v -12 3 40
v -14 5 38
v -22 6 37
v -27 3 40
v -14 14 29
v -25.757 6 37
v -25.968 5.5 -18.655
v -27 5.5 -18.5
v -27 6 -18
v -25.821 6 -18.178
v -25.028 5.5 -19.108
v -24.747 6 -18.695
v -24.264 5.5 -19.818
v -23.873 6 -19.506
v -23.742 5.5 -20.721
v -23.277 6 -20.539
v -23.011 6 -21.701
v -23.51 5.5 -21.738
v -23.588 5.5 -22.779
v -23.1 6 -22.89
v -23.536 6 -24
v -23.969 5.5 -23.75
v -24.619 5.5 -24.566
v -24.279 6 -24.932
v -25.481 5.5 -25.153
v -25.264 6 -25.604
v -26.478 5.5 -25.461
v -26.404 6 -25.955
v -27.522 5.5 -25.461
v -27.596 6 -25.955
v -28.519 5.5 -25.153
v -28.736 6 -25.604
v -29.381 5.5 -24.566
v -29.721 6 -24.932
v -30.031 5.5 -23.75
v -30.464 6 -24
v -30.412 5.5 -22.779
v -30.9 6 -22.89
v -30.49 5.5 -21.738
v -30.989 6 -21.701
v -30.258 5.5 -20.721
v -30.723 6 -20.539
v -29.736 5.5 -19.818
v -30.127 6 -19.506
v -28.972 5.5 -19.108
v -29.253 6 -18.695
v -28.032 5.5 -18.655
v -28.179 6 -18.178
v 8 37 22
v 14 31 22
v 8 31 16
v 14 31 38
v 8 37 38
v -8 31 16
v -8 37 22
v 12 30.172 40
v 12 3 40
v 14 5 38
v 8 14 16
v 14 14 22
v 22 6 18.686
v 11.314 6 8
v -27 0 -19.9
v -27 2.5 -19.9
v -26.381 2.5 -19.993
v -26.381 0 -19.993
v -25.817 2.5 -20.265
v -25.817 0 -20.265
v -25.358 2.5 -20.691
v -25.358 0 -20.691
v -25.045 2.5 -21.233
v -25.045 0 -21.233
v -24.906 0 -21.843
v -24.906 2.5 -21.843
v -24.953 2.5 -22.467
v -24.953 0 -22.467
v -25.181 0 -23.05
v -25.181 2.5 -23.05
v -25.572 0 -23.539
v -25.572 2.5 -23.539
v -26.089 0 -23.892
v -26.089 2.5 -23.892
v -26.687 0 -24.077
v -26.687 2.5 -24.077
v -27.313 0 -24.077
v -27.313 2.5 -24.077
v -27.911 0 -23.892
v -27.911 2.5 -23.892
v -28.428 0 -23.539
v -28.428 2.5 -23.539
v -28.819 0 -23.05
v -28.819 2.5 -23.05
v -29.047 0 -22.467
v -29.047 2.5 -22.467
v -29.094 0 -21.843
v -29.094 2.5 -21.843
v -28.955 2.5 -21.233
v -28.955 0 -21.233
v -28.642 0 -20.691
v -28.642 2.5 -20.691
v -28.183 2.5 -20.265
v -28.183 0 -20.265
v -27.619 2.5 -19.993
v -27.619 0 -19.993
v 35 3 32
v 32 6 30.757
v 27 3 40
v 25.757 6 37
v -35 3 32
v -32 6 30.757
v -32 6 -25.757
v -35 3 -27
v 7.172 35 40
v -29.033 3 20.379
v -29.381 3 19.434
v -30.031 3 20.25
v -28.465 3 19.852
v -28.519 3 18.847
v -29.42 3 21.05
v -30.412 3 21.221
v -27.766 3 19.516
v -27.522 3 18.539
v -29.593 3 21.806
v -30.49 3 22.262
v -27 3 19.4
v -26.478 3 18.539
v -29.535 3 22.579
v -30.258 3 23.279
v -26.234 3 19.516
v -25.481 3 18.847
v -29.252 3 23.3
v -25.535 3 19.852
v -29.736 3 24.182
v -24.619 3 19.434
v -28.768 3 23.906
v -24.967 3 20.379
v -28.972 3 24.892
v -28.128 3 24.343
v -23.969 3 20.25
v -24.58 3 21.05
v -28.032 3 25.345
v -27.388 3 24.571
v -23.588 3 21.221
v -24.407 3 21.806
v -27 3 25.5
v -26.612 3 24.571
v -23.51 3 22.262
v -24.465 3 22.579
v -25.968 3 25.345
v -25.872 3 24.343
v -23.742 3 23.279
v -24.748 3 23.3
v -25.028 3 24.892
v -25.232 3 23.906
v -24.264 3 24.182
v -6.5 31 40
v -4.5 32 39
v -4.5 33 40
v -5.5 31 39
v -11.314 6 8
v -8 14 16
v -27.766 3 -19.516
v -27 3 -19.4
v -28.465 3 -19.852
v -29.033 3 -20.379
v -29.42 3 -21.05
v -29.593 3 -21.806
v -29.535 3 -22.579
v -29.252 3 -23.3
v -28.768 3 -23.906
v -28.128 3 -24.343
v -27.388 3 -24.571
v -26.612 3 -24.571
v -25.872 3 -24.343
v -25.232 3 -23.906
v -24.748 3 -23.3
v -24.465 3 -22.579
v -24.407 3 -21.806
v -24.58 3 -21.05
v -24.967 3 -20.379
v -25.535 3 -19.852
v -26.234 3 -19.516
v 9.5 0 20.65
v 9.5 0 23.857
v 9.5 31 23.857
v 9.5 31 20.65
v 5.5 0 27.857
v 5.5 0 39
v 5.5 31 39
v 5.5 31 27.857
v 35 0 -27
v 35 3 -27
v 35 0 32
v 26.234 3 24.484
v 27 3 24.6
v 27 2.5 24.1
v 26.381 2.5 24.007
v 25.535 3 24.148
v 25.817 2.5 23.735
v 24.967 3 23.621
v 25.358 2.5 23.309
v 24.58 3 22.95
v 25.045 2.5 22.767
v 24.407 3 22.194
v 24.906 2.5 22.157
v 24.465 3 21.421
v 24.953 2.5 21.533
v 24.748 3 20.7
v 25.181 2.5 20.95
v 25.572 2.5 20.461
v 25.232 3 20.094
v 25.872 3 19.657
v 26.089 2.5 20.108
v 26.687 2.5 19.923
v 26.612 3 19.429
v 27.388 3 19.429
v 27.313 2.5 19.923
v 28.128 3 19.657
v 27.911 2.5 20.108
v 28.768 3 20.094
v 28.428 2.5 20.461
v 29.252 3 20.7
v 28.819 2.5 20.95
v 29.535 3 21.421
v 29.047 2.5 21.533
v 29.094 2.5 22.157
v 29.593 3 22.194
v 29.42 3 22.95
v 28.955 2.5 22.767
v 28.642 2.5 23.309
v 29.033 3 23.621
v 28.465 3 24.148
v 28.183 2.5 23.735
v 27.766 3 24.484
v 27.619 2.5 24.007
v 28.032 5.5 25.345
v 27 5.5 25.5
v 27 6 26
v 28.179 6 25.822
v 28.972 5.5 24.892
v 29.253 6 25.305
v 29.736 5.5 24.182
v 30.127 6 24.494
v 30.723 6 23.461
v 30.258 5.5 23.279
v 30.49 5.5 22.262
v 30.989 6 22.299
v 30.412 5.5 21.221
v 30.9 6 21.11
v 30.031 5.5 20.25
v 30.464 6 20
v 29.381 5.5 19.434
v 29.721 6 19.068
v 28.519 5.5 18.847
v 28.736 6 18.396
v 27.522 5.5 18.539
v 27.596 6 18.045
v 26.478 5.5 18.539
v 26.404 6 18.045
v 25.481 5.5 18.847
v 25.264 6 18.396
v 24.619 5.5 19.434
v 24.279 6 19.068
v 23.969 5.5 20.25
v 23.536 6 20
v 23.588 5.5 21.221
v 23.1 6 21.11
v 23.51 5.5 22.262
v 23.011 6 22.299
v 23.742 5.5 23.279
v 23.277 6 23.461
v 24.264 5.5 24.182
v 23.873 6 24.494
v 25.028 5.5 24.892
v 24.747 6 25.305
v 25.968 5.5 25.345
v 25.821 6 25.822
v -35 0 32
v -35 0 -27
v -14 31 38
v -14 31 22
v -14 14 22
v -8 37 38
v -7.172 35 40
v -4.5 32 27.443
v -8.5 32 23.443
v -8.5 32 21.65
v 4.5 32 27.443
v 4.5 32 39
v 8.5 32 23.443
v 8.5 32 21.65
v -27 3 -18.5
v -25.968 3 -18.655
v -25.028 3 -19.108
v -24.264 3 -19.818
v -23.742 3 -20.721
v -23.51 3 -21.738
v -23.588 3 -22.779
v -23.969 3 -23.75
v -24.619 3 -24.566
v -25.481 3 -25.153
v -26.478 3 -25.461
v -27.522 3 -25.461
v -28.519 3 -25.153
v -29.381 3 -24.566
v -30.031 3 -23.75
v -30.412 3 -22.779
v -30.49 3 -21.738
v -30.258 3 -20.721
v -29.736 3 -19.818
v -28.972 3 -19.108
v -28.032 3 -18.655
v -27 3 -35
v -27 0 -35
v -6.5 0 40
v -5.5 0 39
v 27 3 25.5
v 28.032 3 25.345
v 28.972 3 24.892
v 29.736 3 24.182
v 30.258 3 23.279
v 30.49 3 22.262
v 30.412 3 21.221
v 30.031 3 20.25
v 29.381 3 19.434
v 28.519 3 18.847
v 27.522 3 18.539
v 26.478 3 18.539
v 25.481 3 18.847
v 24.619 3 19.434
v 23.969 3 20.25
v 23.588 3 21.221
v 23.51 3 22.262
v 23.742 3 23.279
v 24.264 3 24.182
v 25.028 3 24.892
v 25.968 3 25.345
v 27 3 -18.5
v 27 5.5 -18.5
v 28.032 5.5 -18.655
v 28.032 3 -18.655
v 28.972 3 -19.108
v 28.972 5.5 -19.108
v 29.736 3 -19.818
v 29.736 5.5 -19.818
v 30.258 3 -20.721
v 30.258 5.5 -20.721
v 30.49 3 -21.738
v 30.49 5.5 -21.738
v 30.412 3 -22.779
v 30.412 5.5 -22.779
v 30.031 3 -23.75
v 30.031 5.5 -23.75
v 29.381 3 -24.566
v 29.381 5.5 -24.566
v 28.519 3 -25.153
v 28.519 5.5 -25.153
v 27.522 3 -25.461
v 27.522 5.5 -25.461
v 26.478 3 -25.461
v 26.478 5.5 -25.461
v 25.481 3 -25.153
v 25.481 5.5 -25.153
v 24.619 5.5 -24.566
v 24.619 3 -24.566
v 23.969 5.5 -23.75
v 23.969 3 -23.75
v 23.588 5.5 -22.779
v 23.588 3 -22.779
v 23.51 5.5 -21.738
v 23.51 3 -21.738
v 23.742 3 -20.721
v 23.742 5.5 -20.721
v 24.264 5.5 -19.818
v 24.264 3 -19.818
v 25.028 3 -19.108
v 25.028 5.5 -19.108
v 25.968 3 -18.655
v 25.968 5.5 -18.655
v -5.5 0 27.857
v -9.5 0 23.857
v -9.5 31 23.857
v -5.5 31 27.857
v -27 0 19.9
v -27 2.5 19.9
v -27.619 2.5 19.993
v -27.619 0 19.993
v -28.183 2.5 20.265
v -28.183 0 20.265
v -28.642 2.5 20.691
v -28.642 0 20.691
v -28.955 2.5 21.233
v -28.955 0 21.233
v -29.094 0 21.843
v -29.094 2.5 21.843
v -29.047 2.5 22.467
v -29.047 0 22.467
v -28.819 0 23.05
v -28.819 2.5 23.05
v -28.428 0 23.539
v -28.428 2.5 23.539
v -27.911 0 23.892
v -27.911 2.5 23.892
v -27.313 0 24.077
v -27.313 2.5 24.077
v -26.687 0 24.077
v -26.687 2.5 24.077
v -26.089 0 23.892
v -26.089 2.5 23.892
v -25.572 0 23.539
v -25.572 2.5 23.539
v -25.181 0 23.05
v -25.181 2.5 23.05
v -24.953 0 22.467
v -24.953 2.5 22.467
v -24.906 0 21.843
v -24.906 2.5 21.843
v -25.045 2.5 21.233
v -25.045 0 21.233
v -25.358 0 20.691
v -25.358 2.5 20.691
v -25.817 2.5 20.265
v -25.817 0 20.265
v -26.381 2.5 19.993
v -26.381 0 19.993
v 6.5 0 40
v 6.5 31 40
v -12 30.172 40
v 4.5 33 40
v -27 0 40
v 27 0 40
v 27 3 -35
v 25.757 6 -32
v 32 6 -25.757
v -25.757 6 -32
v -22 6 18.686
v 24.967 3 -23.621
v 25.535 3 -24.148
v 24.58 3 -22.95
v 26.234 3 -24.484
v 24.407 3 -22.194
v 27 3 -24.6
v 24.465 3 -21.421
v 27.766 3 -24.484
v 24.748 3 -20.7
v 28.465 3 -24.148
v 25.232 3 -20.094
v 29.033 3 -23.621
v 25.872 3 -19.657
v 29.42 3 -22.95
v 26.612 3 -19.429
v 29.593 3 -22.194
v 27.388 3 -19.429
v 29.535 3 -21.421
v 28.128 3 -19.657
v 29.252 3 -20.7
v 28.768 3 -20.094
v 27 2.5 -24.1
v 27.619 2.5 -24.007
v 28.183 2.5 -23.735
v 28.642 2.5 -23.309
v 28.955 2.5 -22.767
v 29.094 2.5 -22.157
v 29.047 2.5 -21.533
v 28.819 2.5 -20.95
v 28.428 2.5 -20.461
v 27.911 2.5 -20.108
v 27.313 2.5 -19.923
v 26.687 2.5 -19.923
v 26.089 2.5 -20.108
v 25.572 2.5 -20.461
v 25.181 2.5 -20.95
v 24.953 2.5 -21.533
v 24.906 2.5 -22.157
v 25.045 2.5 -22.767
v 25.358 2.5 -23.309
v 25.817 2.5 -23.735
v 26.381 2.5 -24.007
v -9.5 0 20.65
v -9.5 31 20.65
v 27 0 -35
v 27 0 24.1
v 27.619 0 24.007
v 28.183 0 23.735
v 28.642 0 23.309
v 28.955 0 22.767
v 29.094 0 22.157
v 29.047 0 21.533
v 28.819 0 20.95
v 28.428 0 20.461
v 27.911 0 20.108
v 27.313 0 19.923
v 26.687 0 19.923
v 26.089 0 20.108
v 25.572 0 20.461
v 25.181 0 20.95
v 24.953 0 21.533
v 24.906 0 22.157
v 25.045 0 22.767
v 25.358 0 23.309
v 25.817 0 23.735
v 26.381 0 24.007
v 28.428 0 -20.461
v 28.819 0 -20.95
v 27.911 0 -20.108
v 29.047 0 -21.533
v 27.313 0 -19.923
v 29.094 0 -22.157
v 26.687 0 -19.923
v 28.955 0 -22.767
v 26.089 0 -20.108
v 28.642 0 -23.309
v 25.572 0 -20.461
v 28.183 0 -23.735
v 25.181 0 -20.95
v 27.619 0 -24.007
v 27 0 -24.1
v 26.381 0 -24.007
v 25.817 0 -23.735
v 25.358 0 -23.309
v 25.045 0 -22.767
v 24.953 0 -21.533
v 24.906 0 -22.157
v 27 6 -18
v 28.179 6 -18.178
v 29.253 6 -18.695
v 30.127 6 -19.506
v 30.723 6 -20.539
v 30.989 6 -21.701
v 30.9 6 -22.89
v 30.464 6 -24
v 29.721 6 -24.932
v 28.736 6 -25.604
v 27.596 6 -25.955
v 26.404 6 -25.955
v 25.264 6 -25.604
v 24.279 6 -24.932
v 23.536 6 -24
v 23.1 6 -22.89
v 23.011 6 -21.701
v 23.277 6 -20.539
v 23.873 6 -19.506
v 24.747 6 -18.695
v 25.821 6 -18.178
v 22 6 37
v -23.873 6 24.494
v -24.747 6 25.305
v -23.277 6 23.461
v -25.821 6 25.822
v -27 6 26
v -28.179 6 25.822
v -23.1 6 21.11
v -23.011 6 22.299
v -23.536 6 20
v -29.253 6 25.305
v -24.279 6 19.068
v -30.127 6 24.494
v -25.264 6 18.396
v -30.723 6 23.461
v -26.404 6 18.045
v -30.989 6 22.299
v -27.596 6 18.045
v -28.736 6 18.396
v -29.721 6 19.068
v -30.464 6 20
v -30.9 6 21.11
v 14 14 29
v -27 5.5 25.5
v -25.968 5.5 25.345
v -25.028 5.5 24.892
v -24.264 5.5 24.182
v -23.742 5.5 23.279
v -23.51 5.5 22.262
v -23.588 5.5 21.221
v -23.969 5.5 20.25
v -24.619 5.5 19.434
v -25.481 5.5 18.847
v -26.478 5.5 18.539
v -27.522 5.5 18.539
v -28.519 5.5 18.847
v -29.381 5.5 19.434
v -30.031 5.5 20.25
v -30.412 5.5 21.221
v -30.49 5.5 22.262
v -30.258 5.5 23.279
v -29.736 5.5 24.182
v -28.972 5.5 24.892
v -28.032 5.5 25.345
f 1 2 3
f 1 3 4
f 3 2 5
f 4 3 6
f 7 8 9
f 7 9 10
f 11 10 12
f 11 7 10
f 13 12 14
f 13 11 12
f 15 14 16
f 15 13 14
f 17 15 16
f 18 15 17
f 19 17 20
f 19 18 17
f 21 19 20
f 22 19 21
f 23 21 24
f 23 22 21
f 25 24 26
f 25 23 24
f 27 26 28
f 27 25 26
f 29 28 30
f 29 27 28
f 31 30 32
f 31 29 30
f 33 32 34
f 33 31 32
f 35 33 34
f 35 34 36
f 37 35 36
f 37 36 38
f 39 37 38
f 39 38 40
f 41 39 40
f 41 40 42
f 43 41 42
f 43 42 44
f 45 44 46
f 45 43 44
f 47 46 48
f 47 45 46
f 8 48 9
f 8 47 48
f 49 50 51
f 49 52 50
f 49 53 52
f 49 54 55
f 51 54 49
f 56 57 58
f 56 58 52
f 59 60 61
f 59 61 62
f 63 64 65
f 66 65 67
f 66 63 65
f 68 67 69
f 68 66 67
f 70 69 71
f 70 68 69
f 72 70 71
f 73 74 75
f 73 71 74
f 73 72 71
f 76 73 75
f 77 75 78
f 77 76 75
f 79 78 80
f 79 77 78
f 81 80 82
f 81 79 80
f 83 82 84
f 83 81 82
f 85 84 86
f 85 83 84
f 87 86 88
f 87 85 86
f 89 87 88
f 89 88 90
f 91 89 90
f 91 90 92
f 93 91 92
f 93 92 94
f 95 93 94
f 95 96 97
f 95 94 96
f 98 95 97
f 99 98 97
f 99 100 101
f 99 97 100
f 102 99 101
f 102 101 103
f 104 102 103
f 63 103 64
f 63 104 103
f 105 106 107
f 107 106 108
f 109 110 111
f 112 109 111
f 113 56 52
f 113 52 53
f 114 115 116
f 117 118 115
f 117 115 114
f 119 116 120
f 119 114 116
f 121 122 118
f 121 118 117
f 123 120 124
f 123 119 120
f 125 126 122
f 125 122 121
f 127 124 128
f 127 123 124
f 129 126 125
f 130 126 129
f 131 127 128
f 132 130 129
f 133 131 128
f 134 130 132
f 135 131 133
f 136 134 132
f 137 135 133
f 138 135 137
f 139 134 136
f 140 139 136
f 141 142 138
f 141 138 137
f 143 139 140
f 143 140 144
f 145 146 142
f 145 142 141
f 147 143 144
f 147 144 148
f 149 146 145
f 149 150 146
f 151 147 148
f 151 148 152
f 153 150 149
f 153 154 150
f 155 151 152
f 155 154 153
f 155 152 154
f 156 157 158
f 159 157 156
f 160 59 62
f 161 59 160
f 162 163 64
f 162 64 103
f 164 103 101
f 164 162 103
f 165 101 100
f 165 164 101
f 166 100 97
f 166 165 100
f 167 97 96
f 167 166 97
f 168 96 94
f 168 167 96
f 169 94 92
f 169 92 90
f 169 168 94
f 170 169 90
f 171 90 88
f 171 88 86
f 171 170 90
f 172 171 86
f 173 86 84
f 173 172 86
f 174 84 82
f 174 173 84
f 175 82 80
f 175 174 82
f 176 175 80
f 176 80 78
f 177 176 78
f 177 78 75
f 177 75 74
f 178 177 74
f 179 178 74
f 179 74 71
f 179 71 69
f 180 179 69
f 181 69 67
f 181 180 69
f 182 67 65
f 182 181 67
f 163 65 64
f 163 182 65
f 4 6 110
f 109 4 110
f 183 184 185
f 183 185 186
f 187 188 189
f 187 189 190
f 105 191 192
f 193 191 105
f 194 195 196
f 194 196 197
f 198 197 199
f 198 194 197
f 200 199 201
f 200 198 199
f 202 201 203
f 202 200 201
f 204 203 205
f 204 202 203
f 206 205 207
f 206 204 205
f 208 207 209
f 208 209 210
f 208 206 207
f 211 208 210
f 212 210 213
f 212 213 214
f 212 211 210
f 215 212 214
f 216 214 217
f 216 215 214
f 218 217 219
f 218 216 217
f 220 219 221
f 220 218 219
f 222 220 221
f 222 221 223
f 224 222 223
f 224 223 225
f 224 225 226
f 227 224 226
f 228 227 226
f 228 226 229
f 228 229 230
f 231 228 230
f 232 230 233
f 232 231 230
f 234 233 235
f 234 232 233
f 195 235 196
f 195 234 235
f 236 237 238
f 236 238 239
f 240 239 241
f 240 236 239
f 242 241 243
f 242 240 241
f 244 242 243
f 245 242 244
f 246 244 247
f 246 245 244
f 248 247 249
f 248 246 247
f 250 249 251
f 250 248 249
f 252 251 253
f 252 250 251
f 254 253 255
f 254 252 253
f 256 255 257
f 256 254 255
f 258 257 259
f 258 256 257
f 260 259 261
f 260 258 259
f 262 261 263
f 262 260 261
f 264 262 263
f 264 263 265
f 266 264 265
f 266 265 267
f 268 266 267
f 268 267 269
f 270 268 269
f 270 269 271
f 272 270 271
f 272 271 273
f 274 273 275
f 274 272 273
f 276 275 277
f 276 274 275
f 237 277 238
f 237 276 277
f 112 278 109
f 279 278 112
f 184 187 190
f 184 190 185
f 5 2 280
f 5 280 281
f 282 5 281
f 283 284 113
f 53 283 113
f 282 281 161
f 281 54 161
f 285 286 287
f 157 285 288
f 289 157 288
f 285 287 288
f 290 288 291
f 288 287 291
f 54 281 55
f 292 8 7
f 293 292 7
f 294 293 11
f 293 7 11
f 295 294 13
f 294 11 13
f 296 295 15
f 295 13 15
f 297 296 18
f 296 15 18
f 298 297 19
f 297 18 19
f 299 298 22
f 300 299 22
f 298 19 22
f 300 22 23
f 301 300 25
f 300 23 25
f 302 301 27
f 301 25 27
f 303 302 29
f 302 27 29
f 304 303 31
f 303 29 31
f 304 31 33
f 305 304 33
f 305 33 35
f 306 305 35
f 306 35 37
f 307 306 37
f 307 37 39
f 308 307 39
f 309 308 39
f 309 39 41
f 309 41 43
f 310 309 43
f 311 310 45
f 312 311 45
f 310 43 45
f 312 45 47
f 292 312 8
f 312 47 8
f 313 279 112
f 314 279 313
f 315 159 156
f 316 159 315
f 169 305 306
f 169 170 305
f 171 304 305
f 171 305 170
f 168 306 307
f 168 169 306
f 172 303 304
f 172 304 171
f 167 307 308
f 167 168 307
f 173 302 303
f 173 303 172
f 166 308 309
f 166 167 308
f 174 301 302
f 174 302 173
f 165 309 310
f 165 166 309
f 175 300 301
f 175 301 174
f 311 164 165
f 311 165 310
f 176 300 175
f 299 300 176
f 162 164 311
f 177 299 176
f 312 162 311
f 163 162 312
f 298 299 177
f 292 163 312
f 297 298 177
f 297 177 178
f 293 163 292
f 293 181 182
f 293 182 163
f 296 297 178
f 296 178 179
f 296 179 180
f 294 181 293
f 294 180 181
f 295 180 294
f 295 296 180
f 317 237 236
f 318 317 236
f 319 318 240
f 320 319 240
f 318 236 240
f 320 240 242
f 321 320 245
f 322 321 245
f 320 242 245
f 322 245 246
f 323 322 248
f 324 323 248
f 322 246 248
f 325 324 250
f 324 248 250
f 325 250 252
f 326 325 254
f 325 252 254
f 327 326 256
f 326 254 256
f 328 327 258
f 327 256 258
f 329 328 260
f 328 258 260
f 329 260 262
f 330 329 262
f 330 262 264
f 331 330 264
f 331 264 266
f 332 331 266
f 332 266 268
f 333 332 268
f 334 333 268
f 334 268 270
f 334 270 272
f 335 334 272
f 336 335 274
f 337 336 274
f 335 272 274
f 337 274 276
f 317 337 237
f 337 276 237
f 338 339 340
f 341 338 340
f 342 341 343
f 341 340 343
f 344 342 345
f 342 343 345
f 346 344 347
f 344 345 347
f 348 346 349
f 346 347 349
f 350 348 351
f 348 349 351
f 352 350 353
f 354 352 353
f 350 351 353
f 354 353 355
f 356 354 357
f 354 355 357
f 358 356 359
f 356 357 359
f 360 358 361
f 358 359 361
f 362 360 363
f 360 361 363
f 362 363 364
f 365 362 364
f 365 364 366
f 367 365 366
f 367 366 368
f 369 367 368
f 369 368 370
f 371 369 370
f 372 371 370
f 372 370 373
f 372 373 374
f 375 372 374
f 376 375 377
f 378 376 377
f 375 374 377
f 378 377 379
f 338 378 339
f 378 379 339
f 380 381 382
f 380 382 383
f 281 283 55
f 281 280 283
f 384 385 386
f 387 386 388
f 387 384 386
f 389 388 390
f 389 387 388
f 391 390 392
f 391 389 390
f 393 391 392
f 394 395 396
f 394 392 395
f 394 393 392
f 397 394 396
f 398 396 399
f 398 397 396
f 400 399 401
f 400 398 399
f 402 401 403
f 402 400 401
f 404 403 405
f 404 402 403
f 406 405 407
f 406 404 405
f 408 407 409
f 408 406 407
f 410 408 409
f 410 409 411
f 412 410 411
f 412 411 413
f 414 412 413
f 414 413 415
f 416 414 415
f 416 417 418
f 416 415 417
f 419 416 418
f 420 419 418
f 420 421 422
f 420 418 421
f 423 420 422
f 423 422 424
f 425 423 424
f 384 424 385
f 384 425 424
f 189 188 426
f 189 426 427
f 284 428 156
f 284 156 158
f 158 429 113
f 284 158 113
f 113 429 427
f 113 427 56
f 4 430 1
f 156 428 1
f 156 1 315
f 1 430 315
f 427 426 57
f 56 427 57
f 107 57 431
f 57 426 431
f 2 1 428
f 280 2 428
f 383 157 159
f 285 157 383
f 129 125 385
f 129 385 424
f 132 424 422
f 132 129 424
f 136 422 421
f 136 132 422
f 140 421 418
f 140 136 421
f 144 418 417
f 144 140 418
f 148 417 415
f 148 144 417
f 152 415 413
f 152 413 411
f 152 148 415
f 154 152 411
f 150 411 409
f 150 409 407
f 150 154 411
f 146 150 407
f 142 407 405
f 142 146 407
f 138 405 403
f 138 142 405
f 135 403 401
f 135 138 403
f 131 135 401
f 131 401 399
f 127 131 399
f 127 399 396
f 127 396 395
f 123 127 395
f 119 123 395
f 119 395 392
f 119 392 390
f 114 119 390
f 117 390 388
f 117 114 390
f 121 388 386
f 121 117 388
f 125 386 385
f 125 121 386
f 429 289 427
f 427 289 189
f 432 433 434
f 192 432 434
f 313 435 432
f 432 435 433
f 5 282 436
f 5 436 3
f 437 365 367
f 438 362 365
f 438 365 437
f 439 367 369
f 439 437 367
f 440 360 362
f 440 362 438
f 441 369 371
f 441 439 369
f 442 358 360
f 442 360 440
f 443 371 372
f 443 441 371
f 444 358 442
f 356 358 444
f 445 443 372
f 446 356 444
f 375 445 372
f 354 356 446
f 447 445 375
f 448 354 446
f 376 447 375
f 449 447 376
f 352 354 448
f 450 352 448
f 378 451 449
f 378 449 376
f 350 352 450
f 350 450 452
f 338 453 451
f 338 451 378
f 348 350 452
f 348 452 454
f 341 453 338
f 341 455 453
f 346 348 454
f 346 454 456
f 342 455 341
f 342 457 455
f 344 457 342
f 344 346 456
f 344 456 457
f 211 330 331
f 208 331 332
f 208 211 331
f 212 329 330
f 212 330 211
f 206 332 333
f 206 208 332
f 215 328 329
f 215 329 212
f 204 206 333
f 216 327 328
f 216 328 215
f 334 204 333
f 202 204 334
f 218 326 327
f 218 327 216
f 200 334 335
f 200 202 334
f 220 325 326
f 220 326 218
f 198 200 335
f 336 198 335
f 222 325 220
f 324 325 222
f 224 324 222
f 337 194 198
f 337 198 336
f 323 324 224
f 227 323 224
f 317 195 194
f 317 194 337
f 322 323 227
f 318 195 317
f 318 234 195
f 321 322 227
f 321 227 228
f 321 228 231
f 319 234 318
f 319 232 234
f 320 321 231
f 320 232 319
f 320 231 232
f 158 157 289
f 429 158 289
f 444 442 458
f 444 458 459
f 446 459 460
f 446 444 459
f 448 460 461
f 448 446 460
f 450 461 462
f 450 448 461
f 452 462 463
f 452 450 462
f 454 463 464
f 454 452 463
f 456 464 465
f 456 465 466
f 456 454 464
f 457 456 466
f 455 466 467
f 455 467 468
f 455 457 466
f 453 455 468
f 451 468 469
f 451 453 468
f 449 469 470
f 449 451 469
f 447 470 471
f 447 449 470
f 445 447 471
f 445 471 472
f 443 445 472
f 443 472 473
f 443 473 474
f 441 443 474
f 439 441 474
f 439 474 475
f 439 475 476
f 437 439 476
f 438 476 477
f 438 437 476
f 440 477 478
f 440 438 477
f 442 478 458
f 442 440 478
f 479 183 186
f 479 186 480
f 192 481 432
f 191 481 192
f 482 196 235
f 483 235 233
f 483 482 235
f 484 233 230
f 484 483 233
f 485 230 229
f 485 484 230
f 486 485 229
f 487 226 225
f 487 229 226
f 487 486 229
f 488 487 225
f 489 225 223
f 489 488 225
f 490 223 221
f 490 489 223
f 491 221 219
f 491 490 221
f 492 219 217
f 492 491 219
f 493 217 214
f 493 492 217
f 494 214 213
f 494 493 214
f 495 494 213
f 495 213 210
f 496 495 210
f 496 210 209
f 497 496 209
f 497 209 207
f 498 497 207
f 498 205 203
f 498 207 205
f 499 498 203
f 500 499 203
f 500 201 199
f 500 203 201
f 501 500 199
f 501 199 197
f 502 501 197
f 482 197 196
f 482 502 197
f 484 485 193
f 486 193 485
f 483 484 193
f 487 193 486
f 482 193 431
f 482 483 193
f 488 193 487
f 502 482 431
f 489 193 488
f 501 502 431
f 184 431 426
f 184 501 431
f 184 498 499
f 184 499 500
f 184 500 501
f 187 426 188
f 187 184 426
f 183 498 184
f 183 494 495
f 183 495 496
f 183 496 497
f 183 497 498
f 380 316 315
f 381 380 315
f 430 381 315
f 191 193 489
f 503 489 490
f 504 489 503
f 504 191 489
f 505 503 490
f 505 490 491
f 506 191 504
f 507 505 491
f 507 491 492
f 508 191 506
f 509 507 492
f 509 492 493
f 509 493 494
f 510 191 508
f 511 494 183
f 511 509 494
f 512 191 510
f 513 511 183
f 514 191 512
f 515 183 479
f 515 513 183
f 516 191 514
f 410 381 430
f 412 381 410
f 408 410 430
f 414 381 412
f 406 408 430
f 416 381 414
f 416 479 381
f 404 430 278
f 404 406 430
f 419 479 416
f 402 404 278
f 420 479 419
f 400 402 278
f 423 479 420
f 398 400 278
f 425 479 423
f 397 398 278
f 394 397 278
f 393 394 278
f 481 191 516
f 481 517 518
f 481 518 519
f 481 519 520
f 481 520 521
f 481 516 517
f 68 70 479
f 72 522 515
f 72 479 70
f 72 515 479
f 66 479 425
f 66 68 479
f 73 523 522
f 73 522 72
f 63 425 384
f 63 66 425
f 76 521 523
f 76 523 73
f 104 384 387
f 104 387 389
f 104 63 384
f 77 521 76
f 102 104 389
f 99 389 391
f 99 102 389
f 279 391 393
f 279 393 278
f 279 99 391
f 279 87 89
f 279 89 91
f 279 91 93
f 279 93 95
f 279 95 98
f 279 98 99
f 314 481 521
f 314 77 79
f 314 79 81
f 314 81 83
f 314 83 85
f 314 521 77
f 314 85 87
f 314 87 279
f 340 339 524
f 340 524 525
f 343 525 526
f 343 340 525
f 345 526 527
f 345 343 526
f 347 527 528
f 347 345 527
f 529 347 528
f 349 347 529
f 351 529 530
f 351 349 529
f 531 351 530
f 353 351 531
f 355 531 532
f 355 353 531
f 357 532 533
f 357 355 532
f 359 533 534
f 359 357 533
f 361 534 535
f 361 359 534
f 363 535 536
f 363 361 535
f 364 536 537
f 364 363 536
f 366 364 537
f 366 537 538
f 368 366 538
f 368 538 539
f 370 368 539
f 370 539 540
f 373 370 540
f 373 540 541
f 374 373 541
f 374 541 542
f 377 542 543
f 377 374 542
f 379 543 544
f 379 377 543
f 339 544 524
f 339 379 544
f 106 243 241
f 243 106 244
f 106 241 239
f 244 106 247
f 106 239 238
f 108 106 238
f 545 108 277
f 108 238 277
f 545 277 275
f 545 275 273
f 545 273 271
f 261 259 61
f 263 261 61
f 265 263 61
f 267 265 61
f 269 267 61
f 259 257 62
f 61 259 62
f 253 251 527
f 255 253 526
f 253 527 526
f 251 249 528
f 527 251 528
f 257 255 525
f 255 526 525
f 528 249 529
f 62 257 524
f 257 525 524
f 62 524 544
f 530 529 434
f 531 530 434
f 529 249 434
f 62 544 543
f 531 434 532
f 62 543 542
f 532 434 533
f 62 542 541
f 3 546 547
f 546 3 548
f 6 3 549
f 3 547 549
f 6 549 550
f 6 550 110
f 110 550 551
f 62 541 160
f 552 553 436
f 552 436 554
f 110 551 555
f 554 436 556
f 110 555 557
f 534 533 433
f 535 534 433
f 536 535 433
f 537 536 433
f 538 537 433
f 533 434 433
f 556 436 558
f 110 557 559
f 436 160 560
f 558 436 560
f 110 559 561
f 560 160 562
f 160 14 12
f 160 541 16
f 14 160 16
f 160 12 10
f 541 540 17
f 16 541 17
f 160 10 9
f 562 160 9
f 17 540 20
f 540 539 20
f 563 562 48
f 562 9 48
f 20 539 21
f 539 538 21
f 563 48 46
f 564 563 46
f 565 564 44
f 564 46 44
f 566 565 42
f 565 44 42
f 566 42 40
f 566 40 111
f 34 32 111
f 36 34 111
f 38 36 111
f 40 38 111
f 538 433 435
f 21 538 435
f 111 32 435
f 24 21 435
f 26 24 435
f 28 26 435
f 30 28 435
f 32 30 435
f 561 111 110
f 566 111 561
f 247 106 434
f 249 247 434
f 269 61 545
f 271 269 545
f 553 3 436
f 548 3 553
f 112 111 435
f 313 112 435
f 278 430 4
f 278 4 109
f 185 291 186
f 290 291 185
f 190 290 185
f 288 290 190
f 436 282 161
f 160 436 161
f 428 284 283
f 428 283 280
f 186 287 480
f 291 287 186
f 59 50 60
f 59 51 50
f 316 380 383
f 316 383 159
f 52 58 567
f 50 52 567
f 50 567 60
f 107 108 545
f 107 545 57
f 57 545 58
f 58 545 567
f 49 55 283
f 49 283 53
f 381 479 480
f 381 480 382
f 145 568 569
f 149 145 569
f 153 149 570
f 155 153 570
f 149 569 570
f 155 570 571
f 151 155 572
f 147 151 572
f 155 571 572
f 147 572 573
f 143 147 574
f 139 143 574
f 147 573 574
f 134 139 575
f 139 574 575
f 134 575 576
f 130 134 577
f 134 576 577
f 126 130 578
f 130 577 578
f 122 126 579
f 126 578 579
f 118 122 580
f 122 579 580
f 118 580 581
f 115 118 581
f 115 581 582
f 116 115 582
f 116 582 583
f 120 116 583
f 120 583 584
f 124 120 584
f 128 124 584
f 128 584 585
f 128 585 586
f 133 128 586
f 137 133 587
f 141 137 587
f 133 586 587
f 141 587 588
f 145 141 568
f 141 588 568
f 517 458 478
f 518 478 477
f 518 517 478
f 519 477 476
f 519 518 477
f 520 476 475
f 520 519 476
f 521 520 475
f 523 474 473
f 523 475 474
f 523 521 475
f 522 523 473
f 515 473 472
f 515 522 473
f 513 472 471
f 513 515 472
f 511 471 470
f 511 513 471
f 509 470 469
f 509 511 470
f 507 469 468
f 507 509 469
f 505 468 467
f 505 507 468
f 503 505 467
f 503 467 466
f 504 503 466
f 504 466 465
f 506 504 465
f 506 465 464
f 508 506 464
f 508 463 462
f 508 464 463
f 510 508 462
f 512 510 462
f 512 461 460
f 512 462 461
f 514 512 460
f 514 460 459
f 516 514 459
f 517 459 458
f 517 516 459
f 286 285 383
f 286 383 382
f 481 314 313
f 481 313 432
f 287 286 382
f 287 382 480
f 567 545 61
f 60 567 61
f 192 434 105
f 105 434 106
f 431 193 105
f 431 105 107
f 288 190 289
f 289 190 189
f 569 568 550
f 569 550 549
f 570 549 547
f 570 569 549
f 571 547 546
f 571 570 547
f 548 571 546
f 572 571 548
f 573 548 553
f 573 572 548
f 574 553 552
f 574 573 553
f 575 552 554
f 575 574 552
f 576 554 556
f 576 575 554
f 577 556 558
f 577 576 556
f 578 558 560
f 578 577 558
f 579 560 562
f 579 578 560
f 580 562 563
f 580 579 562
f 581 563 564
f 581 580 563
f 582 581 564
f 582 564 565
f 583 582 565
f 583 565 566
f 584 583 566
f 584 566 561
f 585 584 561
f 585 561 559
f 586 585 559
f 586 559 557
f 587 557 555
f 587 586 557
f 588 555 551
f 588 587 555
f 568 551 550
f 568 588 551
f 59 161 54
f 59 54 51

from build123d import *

# Parameters (mm, degrees)
SKETCH1_R                          = 2.1
MAIN_CAP_EXTRUDE_DEPTH             = 6
MAIN_BODY_CHAMFER_SIZE             = 3
SKETCH4_R                          = 3.5
HOLE_COUNTERSINK_CUT_DEPTH         = 3
HOLE_COUNTERSINK_CHAMFER_SIZE      = 0.5
MAIN_PINION_CHIMNEY_EXTRUDE_DEPTH  = 32
SKETCH3_W                          = 28
SKETCH3_H                          = 24
PINION_CHIMNEY_CAP_EXTRUDE_DEPTH   = 5
INTERNAL_CHIMNEY_CHAMFER_SIZE      = 1
MAIN_CHIMNEY_EXTERNAL_CHAMFER_SIZE = 6
CHIMNEY_PLATE_CHAMFER_SIZE         = 8
CHIMNEY_FRONT_CHAMFER_SIZE         = 2


with BuildPart() as part:
    # Sketch1 → Main Cap Extrude (new body)
    with BuildSketch(Plane(origin=(0, 0, 0), x_dir=(1, 0, 0), z_dir=(0, 1, 0))):
        Polygon((-35, 27), (-27, 35), (27, 35), (35, 27), (35, -32), (27, -40), (5.5, -40), (5.5, -27.857106781), (9.5, -23.857106781), (9.5, -20.65), (-9.5, -20.65), (-9.5, -23.857106781), (-5.5, -27.857106781), (-5.5, -40), (-27, -40), (-35, -32), align=None)
        with Locations(Location((-27, 22, 0), (0, 0, 270))):
            Circle(SKETCH1_R, mode=Mode.SUBTRACT)
        with Locations(Location((27, 22, 0), (0, 0, 90))):
            Circle(SKETCH1_R, mode=Mode.SUBTRACT)
        with Locations(Location((27, -22, 0), (0, 0, 270))):
            Circle(SKETCH1_R, mode=Mode.SUBTRACT)
        with Locations(Location((-27, -22, 0), (0, 0, 90))):
            Circle(SKETCH1_R, mode=Mode.SUBTRACT)
    extrude(amount=MAIN_CAP_EXTRUDE_DEPTH)

    # Main Body Chamfer
    main_body_chamfer_edges = [part.edges().sort_by_distance(p)[0] for p in [
        (-31, 6, -31),
        (-35, 6, 2.5),
        (-31, 6, 36),
        (-16.25, 6, 40),
        (31, 6, -31),
        (16.25, 6, 40),
        (31, 6, 36),
        (35, 6, 2.5),
        (0, 6, -35),
    ]]
    chamfer(main_body_chamfer_edges, length=MAIN_BODY_CHAMFER_SIZE)

    # Sketch4 → Hole Countersink Cut (cut)
    with BuildSketch(Plane(origin=(0, 6, 0), x_dir=(1, 0, 0), z_dir=(0, 1, 0))):
        with Locations(Location((-27, 22, 0), (0, 0, 270))):
            Circle(SKETCH4_R)
        with Locations(Location((-27, -22, 0), (0, 0, 270))):
            Circle(SKETCH4_R)
        with Locations(Location((27, -22, 0), (0, 0, 270))):
            Circle(SKETCH4_R)
        with Locations(Location((27, 22, 0), (0, 0, 270))):
            Circle(SKETCH4_R)
    extrude(amount=-HOLE_COUNTERSINK_CUT_DEPTH, mode=Mode.SUBTRACT)

    # Hole Countersink Chamfer
    hole_countersink_chamfer_edges = [part.edges().sort_by_distance(p)[0] for p in [
        (27, 3, -19.9),
        (27, 6, -25.5),
        (27, 3, 19.9),
        (27, 6, 18.5),
        (-27, 3, 24.1),
        (-27, 6, 18.5),
        (-27, 3, -24.1),
        (-27, 6, -25.5),
    ]]
    chamfer(hole_countersink_chamfer_edges, length=HOLE_COUNTERSINK_CHAMFER_SIZE)

    # Sketch2 → Main Pinion Chimney Extrude (add)
    with BuildSketch(Plane(origin=(0, 0, 0), x_dir=(1, 0, 0), z_dir=(0, 1, 0))):
        Polygon((5.5, -27.857106781), (5.5, -40), (14, -40), (14, -16), (-14, -16), (-14, -40), (-5.5, -40), (-5.5, -27.857106781), (-9.5, -23.857106781), (-9.5, -20.65), (9.5, -20.65), (9.5, -23.857106781), align=None)
    extrude(amount=MAIN_PINION_CHIMNEY_EXTRUDE_DEPTH)

    # Sketch3 → Pinion Chimney Cap Extrude (add)
    with BuildSketch(Plane(origin=(0, 32, 0), x_dir=(1, 0, 0), z_dir=(0, 1, 0))):
        with Locations((0, -28)):
            Rectangle(SKETCH3_W, SKETCH3_H)
    extrude(amount=PINION_CHIMNEY_CAP_EXTRUDE_DEPTH)

    # Internal Chimney Chamfer
    internal_chimney_chamfer_edges = [part.edges().sort_by_distance(p)[0] for p in [
        (9.5, 32, 22.253553391),
        (7.5, 32, 25.857106781),
        (5.5, 32, 33.928553391),
        (-5.5, 32, 33.928553391),
        (-7.5, 32, 25.857106781),
        (-9.5, 32, 22.253553391),
        (0, 32, 20.65),
        (0, 32, 40),
        (-5.5, 16, 40),
        (5.5, 16, 40),
    ]]
    chamfer(internal_chimney_chamfer_edges, length=INTERNAL_CHIMNEY_CHAMFER_SIZE)

    # Main Chimney External Chamfer
    main_chimney_external_chamfer_edges = [part.edges().sort_by_distance(p)[0] for p in [
        (14, 21.5, 16),
        (-14, 21.5, 16),
        (-14, 37, 28),
        (14, 37, 28),
        (0, 37, 16),
    ]]
    chamfer(main_chimney_external_chamfer_edges, length=MAIN_CHIMNEY_EXTERNAL_CHAMFER_SIZE)

    # Chimney Plate Chamfer
    chimney_plate_chamfer_edges = [part.edges().sort_by_distance(p)[0] for p in [
        (-14, 6, 29.5),
        (0, 6, 16),
        (14, 6, 29.5),
        (11, 6, 19),
        (-11, 6, 19),
    ]]
    chamfer(chimney_plate_chamfer_edges, length=CHIMNEY_PLATE_CHAMFER_SIZE)

    # Chimney Front Chamfer
    chimney_front_chamfer_edges = [part.edges().sort_by_distance(p)[0] for p in [
        (14, 17, 40),
        (-14, 17, 40),
        (0, 37, 40),
        (11, 34, 40),
        (-11, 34, 40),
    ]]
    chamfer(chimney_front_chamfer_edges, length=CHIMNEY_FRONT_CHAMFER_SIZE)


solid = part.part
